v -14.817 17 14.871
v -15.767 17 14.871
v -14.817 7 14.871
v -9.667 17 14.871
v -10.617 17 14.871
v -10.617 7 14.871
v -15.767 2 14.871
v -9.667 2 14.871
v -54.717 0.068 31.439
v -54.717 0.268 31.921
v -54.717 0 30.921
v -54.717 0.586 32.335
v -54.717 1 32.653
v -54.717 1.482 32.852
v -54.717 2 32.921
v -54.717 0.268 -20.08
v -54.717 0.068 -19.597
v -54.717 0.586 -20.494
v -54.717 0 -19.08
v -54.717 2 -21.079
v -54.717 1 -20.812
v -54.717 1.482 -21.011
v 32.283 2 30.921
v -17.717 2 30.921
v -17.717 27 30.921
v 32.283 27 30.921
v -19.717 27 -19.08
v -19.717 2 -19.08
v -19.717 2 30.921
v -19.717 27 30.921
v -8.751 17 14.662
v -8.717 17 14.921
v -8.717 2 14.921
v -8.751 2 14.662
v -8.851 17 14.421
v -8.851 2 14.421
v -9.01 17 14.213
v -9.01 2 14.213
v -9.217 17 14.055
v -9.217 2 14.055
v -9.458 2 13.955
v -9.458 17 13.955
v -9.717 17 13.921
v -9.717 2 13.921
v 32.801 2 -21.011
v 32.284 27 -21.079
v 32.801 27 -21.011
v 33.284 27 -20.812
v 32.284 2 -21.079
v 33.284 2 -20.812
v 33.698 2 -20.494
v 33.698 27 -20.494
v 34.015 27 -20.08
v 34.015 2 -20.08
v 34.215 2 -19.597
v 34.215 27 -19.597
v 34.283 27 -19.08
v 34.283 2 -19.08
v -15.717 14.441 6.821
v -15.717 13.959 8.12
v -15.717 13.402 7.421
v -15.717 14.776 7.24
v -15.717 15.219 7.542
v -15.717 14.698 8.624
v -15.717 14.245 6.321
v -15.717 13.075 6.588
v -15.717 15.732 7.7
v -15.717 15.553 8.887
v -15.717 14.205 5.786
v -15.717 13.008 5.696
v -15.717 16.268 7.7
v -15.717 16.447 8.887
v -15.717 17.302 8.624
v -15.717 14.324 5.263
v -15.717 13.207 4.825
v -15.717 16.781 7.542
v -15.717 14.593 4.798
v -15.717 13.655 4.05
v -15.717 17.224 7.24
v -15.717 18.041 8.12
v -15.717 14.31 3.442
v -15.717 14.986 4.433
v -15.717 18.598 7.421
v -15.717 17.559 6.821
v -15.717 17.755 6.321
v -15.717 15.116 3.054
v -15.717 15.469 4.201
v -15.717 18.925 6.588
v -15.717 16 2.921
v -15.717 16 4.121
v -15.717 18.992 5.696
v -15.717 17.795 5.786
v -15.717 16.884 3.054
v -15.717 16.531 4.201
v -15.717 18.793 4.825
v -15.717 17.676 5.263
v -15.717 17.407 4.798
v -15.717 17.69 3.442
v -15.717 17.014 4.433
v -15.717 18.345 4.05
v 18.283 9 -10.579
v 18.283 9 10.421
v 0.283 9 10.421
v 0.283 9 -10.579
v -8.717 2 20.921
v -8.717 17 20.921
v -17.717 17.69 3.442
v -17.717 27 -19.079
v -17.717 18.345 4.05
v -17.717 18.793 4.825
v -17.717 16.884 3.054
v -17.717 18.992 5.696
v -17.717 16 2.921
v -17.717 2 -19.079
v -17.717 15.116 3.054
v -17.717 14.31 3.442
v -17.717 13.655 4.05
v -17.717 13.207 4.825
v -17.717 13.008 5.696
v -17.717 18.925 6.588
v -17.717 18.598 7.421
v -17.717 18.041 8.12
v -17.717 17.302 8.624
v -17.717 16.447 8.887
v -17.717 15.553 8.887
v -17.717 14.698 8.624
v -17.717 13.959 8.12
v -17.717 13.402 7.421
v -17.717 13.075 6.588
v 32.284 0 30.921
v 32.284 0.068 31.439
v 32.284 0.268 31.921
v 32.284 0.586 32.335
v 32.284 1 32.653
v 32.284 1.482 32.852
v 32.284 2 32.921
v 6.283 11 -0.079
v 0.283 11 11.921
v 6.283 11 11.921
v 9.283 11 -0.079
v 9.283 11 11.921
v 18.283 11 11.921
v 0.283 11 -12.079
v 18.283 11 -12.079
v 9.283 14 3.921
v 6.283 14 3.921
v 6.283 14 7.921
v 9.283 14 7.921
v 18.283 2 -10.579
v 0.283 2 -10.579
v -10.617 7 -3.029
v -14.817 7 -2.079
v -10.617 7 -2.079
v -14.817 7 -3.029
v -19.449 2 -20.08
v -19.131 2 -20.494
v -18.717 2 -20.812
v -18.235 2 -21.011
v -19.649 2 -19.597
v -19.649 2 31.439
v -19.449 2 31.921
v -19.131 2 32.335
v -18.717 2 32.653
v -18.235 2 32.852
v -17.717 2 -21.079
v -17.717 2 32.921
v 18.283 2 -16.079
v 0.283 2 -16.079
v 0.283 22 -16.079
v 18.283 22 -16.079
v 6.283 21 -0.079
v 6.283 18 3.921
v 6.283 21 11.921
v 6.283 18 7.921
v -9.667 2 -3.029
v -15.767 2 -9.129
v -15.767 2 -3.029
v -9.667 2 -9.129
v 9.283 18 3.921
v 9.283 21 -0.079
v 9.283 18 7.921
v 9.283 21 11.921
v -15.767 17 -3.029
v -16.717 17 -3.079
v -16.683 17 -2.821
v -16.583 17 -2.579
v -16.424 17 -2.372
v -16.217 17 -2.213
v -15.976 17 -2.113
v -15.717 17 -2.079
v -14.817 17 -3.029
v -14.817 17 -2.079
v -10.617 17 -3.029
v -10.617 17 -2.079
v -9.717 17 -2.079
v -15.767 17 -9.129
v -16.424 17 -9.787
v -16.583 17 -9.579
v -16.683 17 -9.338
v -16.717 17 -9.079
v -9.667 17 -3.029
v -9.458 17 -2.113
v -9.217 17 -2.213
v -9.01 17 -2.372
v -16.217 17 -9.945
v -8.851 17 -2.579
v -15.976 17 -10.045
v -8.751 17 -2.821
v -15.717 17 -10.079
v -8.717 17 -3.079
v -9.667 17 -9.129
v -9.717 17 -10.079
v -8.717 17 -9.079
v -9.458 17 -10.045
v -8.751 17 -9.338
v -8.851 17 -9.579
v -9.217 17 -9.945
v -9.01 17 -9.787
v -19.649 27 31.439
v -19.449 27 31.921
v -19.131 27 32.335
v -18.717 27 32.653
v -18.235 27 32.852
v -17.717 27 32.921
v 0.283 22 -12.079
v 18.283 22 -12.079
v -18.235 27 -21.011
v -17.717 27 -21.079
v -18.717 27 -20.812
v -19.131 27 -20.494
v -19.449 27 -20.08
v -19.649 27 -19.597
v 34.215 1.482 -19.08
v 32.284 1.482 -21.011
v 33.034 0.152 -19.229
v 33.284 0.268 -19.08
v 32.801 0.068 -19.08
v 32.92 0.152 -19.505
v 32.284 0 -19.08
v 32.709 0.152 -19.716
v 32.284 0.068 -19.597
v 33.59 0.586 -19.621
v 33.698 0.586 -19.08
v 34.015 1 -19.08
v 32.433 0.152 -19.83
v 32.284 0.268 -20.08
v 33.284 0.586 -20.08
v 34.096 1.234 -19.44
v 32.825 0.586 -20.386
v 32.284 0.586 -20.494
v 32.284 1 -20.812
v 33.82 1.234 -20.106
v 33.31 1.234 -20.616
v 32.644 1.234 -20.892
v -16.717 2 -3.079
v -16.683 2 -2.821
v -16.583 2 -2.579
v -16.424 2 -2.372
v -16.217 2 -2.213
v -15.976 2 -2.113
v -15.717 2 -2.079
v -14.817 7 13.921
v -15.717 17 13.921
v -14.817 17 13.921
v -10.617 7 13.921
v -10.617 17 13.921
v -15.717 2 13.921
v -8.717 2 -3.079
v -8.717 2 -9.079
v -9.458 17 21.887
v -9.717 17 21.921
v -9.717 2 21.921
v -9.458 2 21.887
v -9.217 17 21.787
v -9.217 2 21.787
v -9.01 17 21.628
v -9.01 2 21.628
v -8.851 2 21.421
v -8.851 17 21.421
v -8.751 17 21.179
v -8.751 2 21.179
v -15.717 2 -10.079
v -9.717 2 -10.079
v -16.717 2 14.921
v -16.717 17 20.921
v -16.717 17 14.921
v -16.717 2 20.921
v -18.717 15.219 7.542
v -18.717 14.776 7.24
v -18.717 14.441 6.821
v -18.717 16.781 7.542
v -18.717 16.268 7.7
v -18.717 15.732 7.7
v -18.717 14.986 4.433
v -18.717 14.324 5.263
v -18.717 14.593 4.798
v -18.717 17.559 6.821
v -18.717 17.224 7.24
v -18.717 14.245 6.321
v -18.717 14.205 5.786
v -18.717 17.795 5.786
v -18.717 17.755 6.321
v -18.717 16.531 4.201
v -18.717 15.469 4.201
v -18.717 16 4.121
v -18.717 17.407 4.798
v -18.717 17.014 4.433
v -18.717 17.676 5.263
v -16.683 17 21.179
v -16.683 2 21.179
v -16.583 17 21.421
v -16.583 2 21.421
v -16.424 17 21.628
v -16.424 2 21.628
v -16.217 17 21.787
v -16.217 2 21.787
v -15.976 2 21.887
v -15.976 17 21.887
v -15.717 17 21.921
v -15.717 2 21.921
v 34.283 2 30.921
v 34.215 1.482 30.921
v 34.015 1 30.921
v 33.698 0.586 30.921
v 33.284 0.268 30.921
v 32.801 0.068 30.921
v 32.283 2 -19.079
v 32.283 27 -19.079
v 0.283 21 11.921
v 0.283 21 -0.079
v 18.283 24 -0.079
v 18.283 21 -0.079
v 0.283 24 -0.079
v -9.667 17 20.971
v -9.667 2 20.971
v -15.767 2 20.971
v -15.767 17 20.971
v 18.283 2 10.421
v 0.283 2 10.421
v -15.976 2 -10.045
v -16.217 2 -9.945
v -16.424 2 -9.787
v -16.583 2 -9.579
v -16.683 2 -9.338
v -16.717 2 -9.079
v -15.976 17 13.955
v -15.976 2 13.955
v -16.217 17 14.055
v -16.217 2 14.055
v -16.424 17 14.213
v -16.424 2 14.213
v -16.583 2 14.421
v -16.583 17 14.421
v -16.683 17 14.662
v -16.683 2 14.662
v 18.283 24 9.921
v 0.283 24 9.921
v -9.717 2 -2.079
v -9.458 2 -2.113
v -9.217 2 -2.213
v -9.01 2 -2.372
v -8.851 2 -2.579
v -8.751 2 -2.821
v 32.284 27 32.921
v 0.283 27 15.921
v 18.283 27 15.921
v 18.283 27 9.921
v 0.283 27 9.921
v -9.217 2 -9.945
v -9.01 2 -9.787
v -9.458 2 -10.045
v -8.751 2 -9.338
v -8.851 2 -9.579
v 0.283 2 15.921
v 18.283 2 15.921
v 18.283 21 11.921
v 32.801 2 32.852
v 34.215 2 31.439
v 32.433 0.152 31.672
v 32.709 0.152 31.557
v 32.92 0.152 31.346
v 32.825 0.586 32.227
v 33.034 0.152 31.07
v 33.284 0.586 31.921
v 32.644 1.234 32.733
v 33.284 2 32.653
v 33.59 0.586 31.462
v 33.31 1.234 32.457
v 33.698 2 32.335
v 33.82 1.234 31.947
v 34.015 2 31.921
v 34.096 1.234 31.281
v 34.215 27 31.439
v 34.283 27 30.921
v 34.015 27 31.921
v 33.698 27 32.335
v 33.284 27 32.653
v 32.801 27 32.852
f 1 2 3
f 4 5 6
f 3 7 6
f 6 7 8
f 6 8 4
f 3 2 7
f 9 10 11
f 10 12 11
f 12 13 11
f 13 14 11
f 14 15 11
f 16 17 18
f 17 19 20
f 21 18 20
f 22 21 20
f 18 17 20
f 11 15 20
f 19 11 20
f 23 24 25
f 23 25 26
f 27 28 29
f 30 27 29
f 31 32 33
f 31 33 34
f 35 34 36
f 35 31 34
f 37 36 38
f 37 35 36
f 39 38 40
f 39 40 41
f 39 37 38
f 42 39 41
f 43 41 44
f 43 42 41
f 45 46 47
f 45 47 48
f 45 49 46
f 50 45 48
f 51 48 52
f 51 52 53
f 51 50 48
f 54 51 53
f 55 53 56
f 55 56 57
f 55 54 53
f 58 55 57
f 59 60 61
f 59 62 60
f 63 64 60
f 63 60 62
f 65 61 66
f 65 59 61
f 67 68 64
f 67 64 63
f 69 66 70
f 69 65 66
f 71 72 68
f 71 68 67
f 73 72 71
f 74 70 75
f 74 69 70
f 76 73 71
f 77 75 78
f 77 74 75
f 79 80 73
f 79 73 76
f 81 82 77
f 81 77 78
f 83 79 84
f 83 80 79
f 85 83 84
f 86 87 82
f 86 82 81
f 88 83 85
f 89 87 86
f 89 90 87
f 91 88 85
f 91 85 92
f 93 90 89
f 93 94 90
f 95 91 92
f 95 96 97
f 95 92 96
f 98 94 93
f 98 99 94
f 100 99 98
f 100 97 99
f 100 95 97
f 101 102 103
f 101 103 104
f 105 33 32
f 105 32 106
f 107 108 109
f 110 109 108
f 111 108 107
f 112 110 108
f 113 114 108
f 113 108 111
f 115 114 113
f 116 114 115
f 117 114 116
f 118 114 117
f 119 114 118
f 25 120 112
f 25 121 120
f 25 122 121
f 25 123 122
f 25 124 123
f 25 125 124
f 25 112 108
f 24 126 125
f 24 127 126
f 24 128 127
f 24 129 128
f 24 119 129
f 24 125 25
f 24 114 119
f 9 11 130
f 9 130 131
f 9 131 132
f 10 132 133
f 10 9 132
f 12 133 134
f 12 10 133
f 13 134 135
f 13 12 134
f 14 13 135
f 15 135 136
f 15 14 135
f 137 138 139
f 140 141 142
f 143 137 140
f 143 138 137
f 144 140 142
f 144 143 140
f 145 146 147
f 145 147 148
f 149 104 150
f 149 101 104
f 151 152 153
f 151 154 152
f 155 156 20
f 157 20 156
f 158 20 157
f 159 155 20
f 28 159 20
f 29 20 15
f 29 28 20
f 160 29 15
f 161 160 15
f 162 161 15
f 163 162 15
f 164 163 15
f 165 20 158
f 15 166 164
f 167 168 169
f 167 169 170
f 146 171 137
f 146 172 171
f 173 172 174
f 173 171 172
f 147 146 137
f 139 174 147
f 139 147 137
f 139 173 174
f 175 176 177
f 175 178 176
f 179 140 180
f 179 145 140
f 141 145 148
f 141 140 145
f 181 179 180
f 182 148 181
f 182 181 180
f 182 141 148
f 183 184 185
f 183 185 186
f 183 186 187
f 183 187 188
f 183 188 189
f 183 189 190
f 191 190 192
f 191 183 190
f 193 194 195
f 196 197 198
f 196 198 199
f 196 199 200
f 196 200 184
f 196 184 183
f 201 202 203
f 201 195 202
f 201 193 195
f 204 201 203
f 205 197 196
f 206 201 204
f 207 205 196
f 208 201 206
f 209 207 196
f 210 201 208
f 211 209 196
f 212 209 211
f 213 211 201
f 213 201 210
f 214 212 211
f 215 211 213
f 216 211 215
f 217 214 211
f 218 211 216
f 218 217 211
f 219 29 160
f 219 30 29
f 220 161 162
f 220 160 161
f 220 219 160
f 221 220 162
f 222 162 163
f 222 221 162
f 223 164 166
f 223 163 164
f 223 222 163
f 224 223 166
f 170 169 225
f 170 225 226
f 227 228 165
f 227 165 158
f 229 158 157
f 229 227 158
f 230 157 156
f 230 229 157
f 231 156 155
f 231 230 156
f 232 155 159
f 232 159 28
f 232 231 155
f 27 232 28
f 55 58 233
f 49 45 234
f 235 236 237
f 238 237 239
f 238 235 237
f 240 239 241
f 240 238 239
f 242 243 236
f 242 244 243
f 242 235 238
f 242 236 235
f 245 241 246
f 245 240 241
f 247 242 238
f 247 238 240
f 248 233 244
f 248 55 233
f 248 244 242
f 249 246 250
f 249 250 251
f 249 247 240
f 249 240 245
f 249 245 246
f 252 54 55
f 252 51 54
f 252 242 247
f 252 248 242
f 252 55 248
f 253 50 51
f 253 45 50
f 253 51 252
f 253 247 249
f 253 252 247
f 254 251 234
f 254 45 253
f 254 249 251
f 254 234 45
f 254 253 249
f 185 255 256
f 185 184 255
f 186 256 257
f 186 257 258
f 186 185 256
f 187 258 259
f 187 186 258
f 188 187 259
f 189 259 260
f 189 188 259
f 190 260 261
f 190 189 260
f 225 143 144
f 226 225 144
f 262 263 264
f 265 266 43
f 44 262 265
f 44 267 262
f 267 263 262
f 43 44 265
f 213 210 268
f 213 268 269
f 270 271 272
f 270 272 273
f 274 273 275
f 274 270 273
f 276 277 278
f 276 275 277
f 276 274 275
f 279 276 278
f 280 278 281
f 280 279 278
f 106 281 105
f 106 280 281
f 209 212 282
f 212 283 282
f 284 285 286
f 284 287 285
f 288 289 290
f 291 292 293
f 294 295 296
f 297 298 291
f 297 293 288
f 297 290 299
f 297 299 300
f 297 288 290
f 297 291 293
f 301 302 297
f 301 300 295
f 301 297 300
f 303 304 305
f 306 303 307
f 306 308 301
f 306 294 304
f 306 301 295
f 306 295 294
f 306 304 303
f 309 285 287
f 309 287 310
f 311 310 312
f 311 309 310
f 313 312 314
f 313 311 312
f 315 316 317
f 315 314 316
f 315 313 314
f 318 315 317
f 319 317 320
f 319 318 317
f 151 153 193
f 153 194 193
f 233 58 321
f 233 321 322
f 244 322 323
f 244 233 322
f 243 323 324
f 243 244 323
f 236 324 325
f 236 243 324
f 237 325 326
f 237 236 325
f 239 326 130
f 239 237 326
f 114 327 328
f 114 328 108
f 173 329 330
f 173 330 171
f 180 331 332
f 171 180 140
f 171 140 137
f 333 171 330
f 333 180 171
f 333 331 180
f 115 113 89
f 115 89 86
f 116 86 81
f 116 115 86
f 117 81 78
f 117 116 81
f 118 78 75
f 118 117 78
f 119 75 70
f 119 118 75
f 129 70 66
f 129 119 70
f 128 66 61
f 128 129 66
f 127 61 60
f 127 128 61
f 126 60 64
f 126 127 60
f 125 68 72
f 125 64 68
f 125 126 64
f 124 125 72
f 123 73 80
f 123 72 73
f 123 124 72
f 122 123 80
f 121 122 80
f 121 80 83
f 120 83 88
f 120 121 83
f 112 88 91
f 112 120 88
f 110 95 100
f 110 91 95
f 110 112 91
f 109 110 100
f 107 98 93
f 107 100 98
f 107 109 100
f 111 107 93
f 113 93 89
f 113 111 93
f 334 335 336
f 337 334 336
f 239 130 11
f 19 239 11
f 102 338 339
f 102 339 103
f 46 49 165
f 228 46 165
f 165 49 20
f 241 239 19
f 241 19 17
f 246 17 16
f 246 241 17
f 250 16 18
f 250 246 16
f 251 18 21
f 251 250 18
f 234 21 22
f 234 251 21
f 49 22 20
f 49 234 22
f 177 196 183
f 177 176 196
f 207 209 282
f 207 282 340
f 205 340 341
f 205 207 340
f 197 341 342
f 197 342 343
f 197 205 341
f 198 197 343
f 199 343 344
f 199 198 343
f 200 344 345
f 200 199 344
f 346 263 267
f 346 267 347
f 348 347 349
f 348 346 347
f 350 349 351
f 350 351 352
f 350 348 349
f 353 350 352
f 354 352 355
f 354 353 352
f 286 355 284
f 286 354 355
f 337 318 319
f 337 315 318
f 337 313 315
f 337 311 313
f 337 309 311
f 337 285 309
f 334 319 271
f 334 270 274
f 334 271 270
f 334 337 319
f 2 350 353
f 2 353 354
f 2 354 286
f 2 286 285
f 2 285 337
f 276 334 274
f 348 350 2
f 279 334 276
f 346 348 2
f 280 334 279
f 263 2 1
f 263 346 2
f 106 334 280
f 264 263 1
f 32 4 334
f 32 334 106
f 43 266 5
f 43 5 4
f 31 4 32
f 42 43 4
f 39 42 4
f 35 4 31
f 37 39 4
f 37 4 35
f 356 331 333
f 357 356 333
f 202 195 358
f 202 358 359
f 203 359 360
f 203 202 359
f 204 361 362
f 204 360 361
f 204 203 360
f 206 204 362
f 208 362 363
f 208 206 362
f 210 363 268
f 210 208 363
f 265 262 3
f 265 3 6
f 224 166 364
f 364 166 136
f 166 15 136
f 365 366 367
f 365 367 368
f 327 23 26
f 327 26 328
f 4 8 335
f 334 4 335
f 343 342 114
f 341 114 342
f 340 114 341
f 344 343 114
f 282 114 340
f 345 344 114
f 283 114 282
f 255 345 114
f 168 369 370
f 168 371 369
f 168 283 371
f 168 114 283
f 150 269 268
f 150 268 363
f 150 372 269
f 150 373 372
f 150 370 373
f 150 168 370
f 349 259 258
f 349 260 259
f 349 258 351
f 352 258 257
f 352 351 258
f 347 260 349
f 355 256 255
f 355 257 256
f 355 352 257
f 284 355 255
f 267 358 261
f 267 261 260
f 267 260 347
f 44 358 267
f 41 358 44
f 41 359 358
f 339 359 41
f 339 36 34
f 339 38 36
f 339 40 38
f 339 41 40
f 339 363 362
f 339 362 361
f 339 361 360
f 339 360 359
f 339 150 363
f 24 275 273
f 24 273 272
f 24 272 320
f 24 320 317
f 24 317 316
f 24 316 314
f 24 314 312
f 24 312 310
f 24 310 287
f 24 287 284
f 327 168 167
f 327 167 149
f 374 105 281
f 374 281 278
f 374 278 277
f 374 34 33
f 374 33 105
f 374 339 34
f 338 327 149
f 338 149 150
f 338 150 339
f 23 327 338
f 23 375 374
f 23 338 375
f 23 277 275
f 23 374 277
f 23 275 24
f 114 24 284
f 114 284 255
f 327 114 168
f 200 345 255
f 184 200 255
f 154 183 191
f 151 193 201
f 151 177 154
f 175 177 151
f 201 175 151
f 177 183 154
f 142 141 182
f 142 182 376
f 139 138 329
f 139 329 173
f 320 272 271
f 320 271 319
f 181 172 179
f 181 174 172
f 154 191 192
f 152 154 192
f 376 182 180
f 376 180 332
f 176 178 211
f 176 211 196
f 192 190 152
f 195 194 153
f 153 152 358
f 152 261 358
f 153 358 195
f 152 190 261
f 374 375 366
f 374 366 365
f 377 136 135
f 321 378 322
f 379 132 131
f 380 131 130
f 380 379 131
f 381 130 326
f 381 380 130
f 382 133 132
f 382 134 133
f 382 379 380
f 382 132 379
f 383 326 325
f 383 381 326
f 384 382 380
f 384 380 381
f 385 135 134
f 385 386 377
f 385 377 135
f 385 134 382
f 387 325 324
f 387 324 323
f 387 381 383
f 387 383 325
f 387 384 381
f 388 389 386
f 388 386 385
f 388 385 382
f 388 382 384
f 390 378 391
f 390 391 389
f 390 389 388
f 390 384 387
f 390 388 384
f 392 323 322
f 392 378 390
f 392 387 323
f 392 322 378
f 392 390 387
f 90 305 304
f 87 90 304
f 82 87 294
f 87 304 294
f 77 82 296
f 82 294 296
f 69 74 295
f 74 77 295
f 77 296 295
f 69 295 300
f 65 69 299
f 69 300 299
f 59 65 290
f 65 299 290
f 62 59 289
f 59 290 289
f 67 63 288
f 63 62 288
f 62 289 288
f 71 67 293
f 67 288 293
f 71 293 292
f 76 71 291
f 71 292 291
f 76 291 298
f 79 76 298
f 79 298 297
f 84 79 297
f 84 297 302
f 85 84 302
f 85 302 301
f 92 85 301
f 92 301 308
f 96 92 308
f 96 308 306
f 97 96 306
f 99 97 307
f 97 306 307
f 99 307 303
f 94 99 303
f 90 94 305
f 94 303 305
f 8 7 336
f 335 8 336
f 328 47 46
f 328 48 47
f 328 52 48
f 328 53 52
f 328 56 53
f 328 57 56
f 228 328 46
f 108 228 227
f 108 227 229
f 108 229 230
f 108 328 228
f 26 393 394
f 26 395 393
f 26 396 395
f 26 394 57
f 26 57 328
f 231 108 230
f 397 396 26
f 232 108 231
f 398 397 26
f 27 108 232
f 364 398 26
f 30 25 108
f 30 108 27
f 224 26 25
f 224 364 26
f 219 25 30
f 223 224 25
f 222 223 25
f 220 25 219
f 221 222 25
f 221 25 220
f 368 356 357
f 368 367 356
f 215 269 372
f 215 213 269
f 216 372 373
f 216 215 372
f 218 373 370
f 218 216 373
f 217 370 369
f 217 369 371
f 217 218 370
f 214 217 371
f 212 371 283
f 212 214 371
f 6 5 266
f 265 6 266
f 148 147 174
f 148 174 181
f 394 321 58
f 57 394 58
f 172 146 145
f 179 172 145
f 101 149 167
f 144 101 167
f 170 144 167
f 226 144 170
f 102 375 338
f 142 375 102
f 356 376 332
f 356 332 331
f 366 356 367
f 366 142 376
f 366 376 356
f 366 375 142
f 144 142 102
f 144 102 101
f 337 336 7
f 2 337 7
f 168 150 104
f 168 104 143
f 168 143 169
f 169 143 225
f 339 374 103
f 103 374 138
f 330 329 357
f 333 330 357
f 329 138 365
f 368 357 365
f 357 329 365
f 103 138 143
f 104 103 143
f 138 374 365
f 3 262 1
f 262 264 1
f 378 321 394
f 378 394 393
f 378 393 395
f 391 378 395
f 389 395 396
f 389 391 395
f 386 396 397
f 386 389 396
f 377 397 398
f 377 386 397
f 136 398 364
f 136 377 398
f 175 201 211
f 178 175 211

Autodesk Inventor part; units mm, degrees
ref_plane "YZ Plane" through (0, 0, 0) normal (1, 0, 0) x (0, 1, 0)
ref_plane "XZ Plane" through (0, 0, 0) normal (0, 1, 0) x (-1, 0, 0)
ref_plane "XY Plane" through (0, 0, 0) normal (0, 0, 1) x (1, 0, 0)
sketch "Sketch1" plane through (0, 0, 0) normal (0, 1, 0) x (-1, 0, 0)
  line L0 (17.7167, 30.9206) -> (-32.2833, 30.9206)
  line L1 (-32.2833, 30.9206) -> (-32.2833, -19.0794)
  line L2 (-32.2833, -19.0794) -> (17.7167, -19.0794)
  line L3 (17.7167, -19.0794) -> (17.7167, 30.9206)
  line L4 (19.7167, 32.9206) -> (-34.2833, 32.9206)
  line L5 (-34.2833, 32.9206) -> (-34.2833, -21.0794)
  line L6 (-34.2833, -21.0794) -> (19.7167, -21.0794)
  line L7 (19.7167, -21.0794) -> (19.7167, 32.9206)
  line L8 (19.7167, 32.9206) -> (54.7167, 32.9206)
  line L9 (54.7167, 32.9206) -> (54.7167, -21.0794)
  line L10 (54.7167, -21.0794) -> (19.7167, -21.0794)
  line L11 (19.7167, -21.0794) -> (19.7167, 32.9206)
  point P0 (0, 0)
  dimension "d0" = 50
  dimension "d1" = 50
  dimension "d2" = 2
  dimension "d3" = 2
  dimension "d4" = 2
  dimension "d5" = 2
  dimension "d6" = 35
  dimension "d7" = 54
extrude "Extrusion1" add sketch "Sketch1" along normal blind 27 contours L7 L6 L5 L4
sketch "Sketch2" plane through (34.2833, 0, 32.9206) normal (1, 0, 0) x (0, 0, -1)
  line L0 (0, 0) -> (0, 27) projected
  line L1 (54, 0) -> (54, 27) projected
  line L2 (0, 0) -> (54, 0)
  line L3 (54, 0) -> (54, 2)
  line L4 (54, 2) -> (0, 2)
  line L5 (0, 2) -> (0, 0)
  point P0 (32.9206, 0)
  dimension "d10" = 2
extrude "Extrusion2" add sketch "Sketch2" against normal blind 89
fillet "Fillet1" radius 2 7 edges at (34.2833, 13.5, 32.9206) (34.2833, 13.5, -21.0794) (-19.7167, 14.5, -21.0794) (-19.7167, 14.5, 32.9206) (34.2833, 0, 5.9206) (-10.2167, 0, 32.9206) (-10.2167, 0, -21.0794)
sketch "Sketch3" plane through (-17.7167, 2, 30.9206) normal (0, 1, 0) x (1, 0, 0)
  line L0 (9, 9) -> (1, 9)
  line L1 (1, 9) -> (1, 17)
  line L2 (1, 17) -> (9, 17)
  line L3 (9, 17) -> (9, 9)
  line L4 (50, 0) -> (0, 0) projected
  line L5 (0, 0) -> (0, 50) projected
  line L6 (8.05, 9.95) -> (1.95, 9.95)
  line L7 (1.95, 9.95) -> (1.95, 16.05)
  line L8 (1.95, 16.05) -> (8.05, 16.05)
  line L9 (8.05, 16.05) -> (8.05, 9.95)
  line L10 (0, 25) -> (50, 25)
  line L11 (0, 50) -> (50, 50) projected
  line L12 (50, 50) -> (50, 0) projected
  line L13 (9, 41) -> (1, 41)
  line L14 (1, 41) -> (1, 33)
  line L15 (1, 33) -> (9, 33)
  line L16 (9, 33) -> (9, 41)
  line L17 (8.05, 40.05) -> (1.95, 40.05)
  line L18 (1.95, 40.05) -> (1.95, 33.95)
  line L19 (1.95, 33.95) -> (8.05, 33.95)
  line L20 (8.05, 33.95) -> (8.05, 40.05)
  line L21 (36, 25) -> (18, 25)
  line L22 (18, 25) -> (18, 47)
  line L23 (18, 47) -> (36, 47)
  line L24 (36, 47) -> (36, 25)
  line L25 (36, 25) -> (18, 25)
  line L26 (18, 25) -> (18, 15)
  line L27 (18, 15) -> (36, 15)
  line L28 (36, 15) -> (36, 25)
  line L29 (36, 47) -> (18, 47)
  line L30 (18, 47) -> (18, 43)
  line L31 (18, 43) -> (36, 43)
  line L32 (36, 43) -> (36, 47)
  line L33 (36, 15) -> (34, 15)
  line L34 (34, 15) -> (34, 47)
  line L35 (34, 47) -> (36, 47)
  line L36 (36, 47) -> (36, 15)
  line L37 (34, 21) -> (33, 21)
  line L38 (33, 21) -> (33, 22)
  line L39 (33, 22) -> (34, 22)
  line L40 (34, 22) -> (34, 21)
  line L41 (34, 28) -> (33, 28)
  line L42 (33, 28) -> (33, 29)
  line L43 (33, 29) -> (34, 29)
  line L44 (34, 29) -> (34, 28)
  line L45 (34, 39) -> (33, 39)
  line L46 (33, 39) -> (33, 40)
  line L47 (33, 40) -> (34, 40)
  line L48 (34, 40) -> (34, 39)
  point P0 (17.7167, 30.9206)
  dimension "d26" = 9
  dimension "d27" = 8
  dimension "d28" = 1
  dimension "d29" = 6.1
  dimension "d30" = 0.95
  dimension "d31" = 0.95
  dimension "d33" = 25
  dimension "d34" = 25
  dimension "d39" = 16
  dimension "d74" = 22
  dimension "d75" = 18
  dimension "d76" = 18
  dimension "d77" = 10
  dimension "d78" = 18
  dimension "d87" = 4
  dimension "d90" = 2
  dimension "d93" = 6
  dimension "d94" = 1
  dimension "d95" = 1
  dimension "d96" = 3
  dimension "d97" = 3
  dimension "d98" = 1
  dimension "d99" = 1
  dimension "d100" = 10
  dimension "d101" = 1
  dimension "d102" = 1
extrude "Extrusion3" add sketch "Sketch3" along normal blind 15 contours L0 L1 L2 L3
sketch "Sketch4" plane through (-17.7167, 2, 30.9206) normal (0, 1, 0) x (1, 0, 0)
  point P0 (17.7167, 30.9206)
extrude "Extrusion4" add sketch "Sketch3" along normal blind 15 contours L16 L15 L14 L13
fillet "Fillet2" radius 1 8 edges at (-8.7167, 9.5, -2.0794) (-8.7167, 9.5, -10.0794) (-16.7167, 9.5, -2.0794) (-16.7167, 9.5, -10.0794) (-8.7167, 9.5, 13.9206) (-8.7167, 9.5, 21.9206) (-16.7167, 9.5, 21.9206) (-16.7167, 9.5, 13.9206)
sketch "Sketch5" plane through (-17.7167, 27, 30.9206) normal (1, 0, 0) x (0, 0, -1)
  circle A0 centre (25, -11) radius 1.8
  line L0 (50, -25) -> (50, 0) projected
  line L1 (0, -25) -> (50, -25) projected
  point P0 (30.9206, -27)
  dimension "d41" = 3.6
  dimension "d42" = 25
  dimension "d43" = 14
extrude "Extrusion5" cut sketch "Sketch5" against normal blind 1
sketch "Sketch6" plane through (-17.7167, 2, 30.9206) normal (0, 1, 0) x (1, 0, 0)
  line L0 (10.5, 9.0139) -> (13.5, 9.0139)
  line L1 (13.5, 9.0139) -> (13.5, 41.0139)
  line L2 (13.5, 41.0139) -> (10.5, 41.0139)
  line L3 (10.5, 41.0139) -> (10.5, 9.0139)
  line L4 (2, 9) -> (8, 9) projected
  line L5 (8, 41) -> (2, 41) projected
  line L6 (9, 16) -> (9, 10) projected
  point P0 (17.7167, 30.9206)
  dimension "d46" = 3
  dimension "d47" = 32
  dimension "d48" = 1.5
extrude "Extrusion6" [suppressed]
sketch "Sketch7" plane through (-4.2167, 2, 21.9067) normal (1, 0, 0) x (0, 0, -1)
  circle A0 centre (15.9861, 14) radius 1.8
  circle A1 centre (15.9861, 14) radius 1.8 projected
  point P0 (21.9067, -2)
  dimension "d51" = 3.6
extrude "Extrusion7" [suppressed]
sketch "Sketch8" plane through (-4.2167, 2, 21.9067) normal (1, 0, 0) x (0, 0, -1)
  line L0 (32.0428, 14) -> (0, 14)
  line L1 (0, 0) -> (0, 14) projected
  line L2 (0, 14) -> (32, 14) projected
  line L3 (32, 0) -> (0, 0) projected
  point P0 (21.9067, -2)
  dimension "d54" = 14
sketch "Sketch9" plane through (-17.7167, 27, 30.9206) normal (1, 0, 0) x (0, 0, -1)
  line L0 (3.6476, -12) -> (44.1553, -12)
  line L1 (44.1553, -12) -> (44.1553, -24)
  line L2 (44.1553, -24) -> (3.6476, -24)
  line L3 (3.6476, -24) -> (3.6476, -12)
  line L4 (0, -25) -> (50, -25) projected
  point P0 (30.9206, -27)
  dimension "d55" = 12
  dimension "d56" = 1
extrude "Extrusion8" [suppressed]
sketch "Sketch10" plane through (-17.7167, 17, 30.9206) normal (0, 1, 0) x (1, 0, 0)
  line L0 (8.05, 16.05) -> (1.95, 16.05) projected
  line L1 (2, 17) -> (8, 17) projected
  line L2 (2.9, 16.05) -> (7.1, 16.05)
  line L3 (7.1, 16.05) -> (7.1, 17)
  line L4 (7.1, 17) -> (2.9, 17)
  line L5 (2.9, 17) -> (2.9, 16.05)
  line L6 (1.95, 9.95) -> (1.95, 16.05) projected
  line L7 (8.05, 16.05) -> (8.05, 9.95) projected
  point P0 (17.7167, 30.9206)
  dimension "d59" = 0.95
  dimension "d60" = 0.95
extrude "Extrusion9" cut sketch "Sketch10" against normal blind 10
sketch "Sketch11" plane through (-17.7167, 17, 30.9206) normal (0, 1, 0) x (1, 0, 0)
  line L0 (8, 33) -> (2, 33) projected
  line L1 (8.05, 33.95) -> (1.95, 33.95) projected
  line L2 (2.9, 33) -> (7.1, 33)
  line L3 (7.1, 33) -> (7.1, 33.95)
  line L4 (7.1, 33.95) -> (2.9, 33.95)
  line L5 (2.9, 33.95) -> (2.9, 33)
  line L6 (1.95, 33.95) -> (1.95, 40.05) projected
  line L7 (8.05, 40.05) -> (8.05, 33.95) projected
  point P0 (17.7167, 30.9206)
  dimension "d63" = 0.95
  dimension "d64" = 0.95
  dimension "d65" = 0.95
extrude "Extrusion10" cut sketch "Sketch11" against normal blind 10
sketch "Sketch12" plane through (-17.7167, 27, 30.9206) normal (1, 0, 0) x (0, 0, -1)
  circle A0 centre (25, -11) radius 3
  circle A1 centre (25, -11) radius 1.8 projected
  point P0 (30.9206, -27)
  dimension "d68" = 6
extrude "Extrusion11" add sketch "Sketch12" along normal blind 2
sketch "Sketch13" plane through (-17.7167, 16, 30.9206) normal (0, 1, 0) x (1, 0, 0)
  line L0 (13.5, 41.0139) -> (13.5, 9.0139) projected
  line L1 (13.5, 41.0139) -> (10.5, 41.0139) projected
  line L2 (13.5, 31.0139) -> (10.5, 31.0139)
  line L3 (10.5, 31.0139) -> (10.5, 41.0139)
  line L4 (10.5, 41.0139) -> (13.5, 41.0139)
  line L5 (13.5, 41.0139) -> (13.5, 31.0139)
  line L6 (10.5, 9.0139) -> (13.5, 9.0139) projected
  point P0 (17.7167, 30.9206)
  dimension "d71" = 10
extrude "Extrusion12" [suppressed]
sketch "Sketch14" plane through (-17.7167, 2, 30.9206) normal (0, 1, 0) x (1, 0, 0)
  point P0 (17.7167, 30.9206)
extrude "Extrusion13" add sketch "Sketch3" along normal blind 9 contours L28 L27 L34 L10 | L10 L34 L31 L24 | L22 L31 L34 L47 L46 L45 L43 L42 L41 L10 | L10 L34 L39 L38 L37 L27 L26 | L31 L34 L23 L24 | L22 L23 L34 L31 | L34 L37 L38 L39 | L41 L42 L43 L34 | L34 L45 L46 L47
sketch "Sketch15" plane through (-17.7167, 11, 30.9206) normal (0, 1, 0) x (1, 0, 0)
  line L0 (36, 47) -> (36, 15) projected
  line L1 (18, 47) -> (18, 15) projected
  line L2 (36, 15) -> (18, 15)
  line L3 (18, 15) -> (18, 19)
  line L4 (18, 19) -> (36, 19)
  line L5 (36, 19) -> (36, 15)
  point P0 (17.7167, 30.9206)
  dimension "d81" = 4
extrude "Extrusion14" add sketch "Sketch15" along normal blind 16
extrude "Extrusion16" add sketch "Sketch3" along normal blind 20 contours L31 L34 L23 L24 | L22 L23 L34 L31
extrude "Extrusion17" [suppressed]
extrude "Extrusion18" [suppressed]
extrude "Extrusion19" [suppressed]
extrude "Extrusion20" [suppressed]
sketch "Sketch17" plane through (18.2833, 11, 11.9206) normal (0, 0, -1) x (-1, 0, 0)
  line L0 (0, -9) -> (0, 16) projected
  line L1 (18, -9) -> (18, 16) projected
  line L2 (0, 16) -> (18, 16)
  line L3 (18, 16) -> (18, 10)
  line L4 (18, 10) -> (0, 10)
  line L5 (0, 10) -> (0, 16)
  point P0 (18.2833, -11)
  dimension "d109" = 6
extrude "Extrusion21" add sketch "Sketch17" along normal blind 12
sketch "Sketch18" plane through (-17.7167, 11, 30.9206) normal (0, 1, 0) x (1, 0, 0)
  line L0 (18, 19) -> (36, 19) projected
  line L1 (27, 19) -> (24, 19)
  line L2 (24, 19) -> (24, 23)
  line L3 (24, 23) -> (27, 23)
  line L4 (27, 23) -> (27, 19)
  line L5 (18, 43) -> (18, 19) projected
  line L6 (24, 27) -> (27, 27)
  line L7 (27, 27) -> (27, 31)
  line L8 (27, 31) -> (24, 31)
  line L9 (24, 31) -> (24, 27)
  line L10 (24, 27) -> (27, 27)
  line L11 (27, 27) -> (27, 23)
  line L12 (27, 23) -> (24, 23)
  line L13 (24, 23) -> (24, 27)
  point P0 (17.7167, 30.9206)
  dimension "d112" = 9
  dimension "d113" = 3
  dimension "d114" = 4
  dimension "d115" = 3
  dimension "d116" = 4
  dimension "d133" = 4
sketch "Sketch19" plane through (-17.7167, 11, 30.9206) normal (0, 1, 0) x (1, 0, 0)
  point P0 (17.7167, 30.9206)
extrude "Extrusion22" add sketch "Sketch18" along normal blind 10 contours L2 L3 L4 L0 | L9 L8 L7 L6
extrude "Extrusion23" add sketch "Sketch18" along normal blind 3 contours L13 L6 L11 L3
sketch "Sketch20" plane through (9.2833, 21, 7.9206) normal (0, 0, -1) x (-1, 0, 0)
  point P0 (9.2833, -21)
sketch "Sketch21" plane through (9.2833, 21, 7.9206) normal (0, 0, -1) x (-1, 0, 0)
  line L0 (0, 0) -> (3, 0) projected
  line L1 (0, 0) -> (3, 0)
  line L2 (3, 0) -> (3, -3)
  line L3 (3, -3) -> (0, -3)
  line L4 (0, -3) -> (0, 0)
  point P0 (9.2833, -21)
  dimension "d121" = 3
extrude "Extrusion24" add sketch "Sketch21" along normal blind 4
sketch "Sketch22" plane through (18.2833, 2, 15.9206) normal (1, 0, 0) x (0, 0, -1)
  line L0 (5.5, 7) -> (26.5, 7)
  line L1 (26.5, 7) -> (26.5, 0)
  line L2 (26.5, 0) -> (5.5, 0)
  line L3 (5.5, 0) -> (5.5, 7)
  line L4 (4, 9) -> (28, 9) projected
  line L5 (28, 9) -> (28, 20) projected
  point P0 (15.9206, -2)
  dimension "d124" = 2
  dimension "d125" = 7
  dimension "d126" = 21
  dimension "d129" = 1.5
extrude "Extrusion25" cut sketch "Sketch22" against normal blind 20
sketch "Sketch23" plane through (18.2833, 11, -0.0794) normal (0, 0, -1) x (-1, 0, 0)
  line L0 (18, 16) -> (0, 16) projected
  line L1 (0, 16) -> (0, 10) projected
  line L2 (18, 16) -> (0, 16)
  line L3 (0, 16) -> (0, 13)
  line L4 (0, 13) -> (18, 13)
  line L5 (18, 13) -> (18, 16)
  point P0 (18.2833, -11)
  dimension "d130" = 3
extrude "Extrusion26" cut sketch "Sketch23" against normal blind 10
equation "\"d1\" = d0"
equation "\"d76\" = d75"
equation "\"d98\" = d95"
equation "\"d99\" = d94"
equation "\"d101\" = d99"
equation "\"d102\" = d95"
equation "\"d54\" = d43"
equation "\"d115\" = d113"
equation "\"d116\" = d114"
properties part number "ohisje"
